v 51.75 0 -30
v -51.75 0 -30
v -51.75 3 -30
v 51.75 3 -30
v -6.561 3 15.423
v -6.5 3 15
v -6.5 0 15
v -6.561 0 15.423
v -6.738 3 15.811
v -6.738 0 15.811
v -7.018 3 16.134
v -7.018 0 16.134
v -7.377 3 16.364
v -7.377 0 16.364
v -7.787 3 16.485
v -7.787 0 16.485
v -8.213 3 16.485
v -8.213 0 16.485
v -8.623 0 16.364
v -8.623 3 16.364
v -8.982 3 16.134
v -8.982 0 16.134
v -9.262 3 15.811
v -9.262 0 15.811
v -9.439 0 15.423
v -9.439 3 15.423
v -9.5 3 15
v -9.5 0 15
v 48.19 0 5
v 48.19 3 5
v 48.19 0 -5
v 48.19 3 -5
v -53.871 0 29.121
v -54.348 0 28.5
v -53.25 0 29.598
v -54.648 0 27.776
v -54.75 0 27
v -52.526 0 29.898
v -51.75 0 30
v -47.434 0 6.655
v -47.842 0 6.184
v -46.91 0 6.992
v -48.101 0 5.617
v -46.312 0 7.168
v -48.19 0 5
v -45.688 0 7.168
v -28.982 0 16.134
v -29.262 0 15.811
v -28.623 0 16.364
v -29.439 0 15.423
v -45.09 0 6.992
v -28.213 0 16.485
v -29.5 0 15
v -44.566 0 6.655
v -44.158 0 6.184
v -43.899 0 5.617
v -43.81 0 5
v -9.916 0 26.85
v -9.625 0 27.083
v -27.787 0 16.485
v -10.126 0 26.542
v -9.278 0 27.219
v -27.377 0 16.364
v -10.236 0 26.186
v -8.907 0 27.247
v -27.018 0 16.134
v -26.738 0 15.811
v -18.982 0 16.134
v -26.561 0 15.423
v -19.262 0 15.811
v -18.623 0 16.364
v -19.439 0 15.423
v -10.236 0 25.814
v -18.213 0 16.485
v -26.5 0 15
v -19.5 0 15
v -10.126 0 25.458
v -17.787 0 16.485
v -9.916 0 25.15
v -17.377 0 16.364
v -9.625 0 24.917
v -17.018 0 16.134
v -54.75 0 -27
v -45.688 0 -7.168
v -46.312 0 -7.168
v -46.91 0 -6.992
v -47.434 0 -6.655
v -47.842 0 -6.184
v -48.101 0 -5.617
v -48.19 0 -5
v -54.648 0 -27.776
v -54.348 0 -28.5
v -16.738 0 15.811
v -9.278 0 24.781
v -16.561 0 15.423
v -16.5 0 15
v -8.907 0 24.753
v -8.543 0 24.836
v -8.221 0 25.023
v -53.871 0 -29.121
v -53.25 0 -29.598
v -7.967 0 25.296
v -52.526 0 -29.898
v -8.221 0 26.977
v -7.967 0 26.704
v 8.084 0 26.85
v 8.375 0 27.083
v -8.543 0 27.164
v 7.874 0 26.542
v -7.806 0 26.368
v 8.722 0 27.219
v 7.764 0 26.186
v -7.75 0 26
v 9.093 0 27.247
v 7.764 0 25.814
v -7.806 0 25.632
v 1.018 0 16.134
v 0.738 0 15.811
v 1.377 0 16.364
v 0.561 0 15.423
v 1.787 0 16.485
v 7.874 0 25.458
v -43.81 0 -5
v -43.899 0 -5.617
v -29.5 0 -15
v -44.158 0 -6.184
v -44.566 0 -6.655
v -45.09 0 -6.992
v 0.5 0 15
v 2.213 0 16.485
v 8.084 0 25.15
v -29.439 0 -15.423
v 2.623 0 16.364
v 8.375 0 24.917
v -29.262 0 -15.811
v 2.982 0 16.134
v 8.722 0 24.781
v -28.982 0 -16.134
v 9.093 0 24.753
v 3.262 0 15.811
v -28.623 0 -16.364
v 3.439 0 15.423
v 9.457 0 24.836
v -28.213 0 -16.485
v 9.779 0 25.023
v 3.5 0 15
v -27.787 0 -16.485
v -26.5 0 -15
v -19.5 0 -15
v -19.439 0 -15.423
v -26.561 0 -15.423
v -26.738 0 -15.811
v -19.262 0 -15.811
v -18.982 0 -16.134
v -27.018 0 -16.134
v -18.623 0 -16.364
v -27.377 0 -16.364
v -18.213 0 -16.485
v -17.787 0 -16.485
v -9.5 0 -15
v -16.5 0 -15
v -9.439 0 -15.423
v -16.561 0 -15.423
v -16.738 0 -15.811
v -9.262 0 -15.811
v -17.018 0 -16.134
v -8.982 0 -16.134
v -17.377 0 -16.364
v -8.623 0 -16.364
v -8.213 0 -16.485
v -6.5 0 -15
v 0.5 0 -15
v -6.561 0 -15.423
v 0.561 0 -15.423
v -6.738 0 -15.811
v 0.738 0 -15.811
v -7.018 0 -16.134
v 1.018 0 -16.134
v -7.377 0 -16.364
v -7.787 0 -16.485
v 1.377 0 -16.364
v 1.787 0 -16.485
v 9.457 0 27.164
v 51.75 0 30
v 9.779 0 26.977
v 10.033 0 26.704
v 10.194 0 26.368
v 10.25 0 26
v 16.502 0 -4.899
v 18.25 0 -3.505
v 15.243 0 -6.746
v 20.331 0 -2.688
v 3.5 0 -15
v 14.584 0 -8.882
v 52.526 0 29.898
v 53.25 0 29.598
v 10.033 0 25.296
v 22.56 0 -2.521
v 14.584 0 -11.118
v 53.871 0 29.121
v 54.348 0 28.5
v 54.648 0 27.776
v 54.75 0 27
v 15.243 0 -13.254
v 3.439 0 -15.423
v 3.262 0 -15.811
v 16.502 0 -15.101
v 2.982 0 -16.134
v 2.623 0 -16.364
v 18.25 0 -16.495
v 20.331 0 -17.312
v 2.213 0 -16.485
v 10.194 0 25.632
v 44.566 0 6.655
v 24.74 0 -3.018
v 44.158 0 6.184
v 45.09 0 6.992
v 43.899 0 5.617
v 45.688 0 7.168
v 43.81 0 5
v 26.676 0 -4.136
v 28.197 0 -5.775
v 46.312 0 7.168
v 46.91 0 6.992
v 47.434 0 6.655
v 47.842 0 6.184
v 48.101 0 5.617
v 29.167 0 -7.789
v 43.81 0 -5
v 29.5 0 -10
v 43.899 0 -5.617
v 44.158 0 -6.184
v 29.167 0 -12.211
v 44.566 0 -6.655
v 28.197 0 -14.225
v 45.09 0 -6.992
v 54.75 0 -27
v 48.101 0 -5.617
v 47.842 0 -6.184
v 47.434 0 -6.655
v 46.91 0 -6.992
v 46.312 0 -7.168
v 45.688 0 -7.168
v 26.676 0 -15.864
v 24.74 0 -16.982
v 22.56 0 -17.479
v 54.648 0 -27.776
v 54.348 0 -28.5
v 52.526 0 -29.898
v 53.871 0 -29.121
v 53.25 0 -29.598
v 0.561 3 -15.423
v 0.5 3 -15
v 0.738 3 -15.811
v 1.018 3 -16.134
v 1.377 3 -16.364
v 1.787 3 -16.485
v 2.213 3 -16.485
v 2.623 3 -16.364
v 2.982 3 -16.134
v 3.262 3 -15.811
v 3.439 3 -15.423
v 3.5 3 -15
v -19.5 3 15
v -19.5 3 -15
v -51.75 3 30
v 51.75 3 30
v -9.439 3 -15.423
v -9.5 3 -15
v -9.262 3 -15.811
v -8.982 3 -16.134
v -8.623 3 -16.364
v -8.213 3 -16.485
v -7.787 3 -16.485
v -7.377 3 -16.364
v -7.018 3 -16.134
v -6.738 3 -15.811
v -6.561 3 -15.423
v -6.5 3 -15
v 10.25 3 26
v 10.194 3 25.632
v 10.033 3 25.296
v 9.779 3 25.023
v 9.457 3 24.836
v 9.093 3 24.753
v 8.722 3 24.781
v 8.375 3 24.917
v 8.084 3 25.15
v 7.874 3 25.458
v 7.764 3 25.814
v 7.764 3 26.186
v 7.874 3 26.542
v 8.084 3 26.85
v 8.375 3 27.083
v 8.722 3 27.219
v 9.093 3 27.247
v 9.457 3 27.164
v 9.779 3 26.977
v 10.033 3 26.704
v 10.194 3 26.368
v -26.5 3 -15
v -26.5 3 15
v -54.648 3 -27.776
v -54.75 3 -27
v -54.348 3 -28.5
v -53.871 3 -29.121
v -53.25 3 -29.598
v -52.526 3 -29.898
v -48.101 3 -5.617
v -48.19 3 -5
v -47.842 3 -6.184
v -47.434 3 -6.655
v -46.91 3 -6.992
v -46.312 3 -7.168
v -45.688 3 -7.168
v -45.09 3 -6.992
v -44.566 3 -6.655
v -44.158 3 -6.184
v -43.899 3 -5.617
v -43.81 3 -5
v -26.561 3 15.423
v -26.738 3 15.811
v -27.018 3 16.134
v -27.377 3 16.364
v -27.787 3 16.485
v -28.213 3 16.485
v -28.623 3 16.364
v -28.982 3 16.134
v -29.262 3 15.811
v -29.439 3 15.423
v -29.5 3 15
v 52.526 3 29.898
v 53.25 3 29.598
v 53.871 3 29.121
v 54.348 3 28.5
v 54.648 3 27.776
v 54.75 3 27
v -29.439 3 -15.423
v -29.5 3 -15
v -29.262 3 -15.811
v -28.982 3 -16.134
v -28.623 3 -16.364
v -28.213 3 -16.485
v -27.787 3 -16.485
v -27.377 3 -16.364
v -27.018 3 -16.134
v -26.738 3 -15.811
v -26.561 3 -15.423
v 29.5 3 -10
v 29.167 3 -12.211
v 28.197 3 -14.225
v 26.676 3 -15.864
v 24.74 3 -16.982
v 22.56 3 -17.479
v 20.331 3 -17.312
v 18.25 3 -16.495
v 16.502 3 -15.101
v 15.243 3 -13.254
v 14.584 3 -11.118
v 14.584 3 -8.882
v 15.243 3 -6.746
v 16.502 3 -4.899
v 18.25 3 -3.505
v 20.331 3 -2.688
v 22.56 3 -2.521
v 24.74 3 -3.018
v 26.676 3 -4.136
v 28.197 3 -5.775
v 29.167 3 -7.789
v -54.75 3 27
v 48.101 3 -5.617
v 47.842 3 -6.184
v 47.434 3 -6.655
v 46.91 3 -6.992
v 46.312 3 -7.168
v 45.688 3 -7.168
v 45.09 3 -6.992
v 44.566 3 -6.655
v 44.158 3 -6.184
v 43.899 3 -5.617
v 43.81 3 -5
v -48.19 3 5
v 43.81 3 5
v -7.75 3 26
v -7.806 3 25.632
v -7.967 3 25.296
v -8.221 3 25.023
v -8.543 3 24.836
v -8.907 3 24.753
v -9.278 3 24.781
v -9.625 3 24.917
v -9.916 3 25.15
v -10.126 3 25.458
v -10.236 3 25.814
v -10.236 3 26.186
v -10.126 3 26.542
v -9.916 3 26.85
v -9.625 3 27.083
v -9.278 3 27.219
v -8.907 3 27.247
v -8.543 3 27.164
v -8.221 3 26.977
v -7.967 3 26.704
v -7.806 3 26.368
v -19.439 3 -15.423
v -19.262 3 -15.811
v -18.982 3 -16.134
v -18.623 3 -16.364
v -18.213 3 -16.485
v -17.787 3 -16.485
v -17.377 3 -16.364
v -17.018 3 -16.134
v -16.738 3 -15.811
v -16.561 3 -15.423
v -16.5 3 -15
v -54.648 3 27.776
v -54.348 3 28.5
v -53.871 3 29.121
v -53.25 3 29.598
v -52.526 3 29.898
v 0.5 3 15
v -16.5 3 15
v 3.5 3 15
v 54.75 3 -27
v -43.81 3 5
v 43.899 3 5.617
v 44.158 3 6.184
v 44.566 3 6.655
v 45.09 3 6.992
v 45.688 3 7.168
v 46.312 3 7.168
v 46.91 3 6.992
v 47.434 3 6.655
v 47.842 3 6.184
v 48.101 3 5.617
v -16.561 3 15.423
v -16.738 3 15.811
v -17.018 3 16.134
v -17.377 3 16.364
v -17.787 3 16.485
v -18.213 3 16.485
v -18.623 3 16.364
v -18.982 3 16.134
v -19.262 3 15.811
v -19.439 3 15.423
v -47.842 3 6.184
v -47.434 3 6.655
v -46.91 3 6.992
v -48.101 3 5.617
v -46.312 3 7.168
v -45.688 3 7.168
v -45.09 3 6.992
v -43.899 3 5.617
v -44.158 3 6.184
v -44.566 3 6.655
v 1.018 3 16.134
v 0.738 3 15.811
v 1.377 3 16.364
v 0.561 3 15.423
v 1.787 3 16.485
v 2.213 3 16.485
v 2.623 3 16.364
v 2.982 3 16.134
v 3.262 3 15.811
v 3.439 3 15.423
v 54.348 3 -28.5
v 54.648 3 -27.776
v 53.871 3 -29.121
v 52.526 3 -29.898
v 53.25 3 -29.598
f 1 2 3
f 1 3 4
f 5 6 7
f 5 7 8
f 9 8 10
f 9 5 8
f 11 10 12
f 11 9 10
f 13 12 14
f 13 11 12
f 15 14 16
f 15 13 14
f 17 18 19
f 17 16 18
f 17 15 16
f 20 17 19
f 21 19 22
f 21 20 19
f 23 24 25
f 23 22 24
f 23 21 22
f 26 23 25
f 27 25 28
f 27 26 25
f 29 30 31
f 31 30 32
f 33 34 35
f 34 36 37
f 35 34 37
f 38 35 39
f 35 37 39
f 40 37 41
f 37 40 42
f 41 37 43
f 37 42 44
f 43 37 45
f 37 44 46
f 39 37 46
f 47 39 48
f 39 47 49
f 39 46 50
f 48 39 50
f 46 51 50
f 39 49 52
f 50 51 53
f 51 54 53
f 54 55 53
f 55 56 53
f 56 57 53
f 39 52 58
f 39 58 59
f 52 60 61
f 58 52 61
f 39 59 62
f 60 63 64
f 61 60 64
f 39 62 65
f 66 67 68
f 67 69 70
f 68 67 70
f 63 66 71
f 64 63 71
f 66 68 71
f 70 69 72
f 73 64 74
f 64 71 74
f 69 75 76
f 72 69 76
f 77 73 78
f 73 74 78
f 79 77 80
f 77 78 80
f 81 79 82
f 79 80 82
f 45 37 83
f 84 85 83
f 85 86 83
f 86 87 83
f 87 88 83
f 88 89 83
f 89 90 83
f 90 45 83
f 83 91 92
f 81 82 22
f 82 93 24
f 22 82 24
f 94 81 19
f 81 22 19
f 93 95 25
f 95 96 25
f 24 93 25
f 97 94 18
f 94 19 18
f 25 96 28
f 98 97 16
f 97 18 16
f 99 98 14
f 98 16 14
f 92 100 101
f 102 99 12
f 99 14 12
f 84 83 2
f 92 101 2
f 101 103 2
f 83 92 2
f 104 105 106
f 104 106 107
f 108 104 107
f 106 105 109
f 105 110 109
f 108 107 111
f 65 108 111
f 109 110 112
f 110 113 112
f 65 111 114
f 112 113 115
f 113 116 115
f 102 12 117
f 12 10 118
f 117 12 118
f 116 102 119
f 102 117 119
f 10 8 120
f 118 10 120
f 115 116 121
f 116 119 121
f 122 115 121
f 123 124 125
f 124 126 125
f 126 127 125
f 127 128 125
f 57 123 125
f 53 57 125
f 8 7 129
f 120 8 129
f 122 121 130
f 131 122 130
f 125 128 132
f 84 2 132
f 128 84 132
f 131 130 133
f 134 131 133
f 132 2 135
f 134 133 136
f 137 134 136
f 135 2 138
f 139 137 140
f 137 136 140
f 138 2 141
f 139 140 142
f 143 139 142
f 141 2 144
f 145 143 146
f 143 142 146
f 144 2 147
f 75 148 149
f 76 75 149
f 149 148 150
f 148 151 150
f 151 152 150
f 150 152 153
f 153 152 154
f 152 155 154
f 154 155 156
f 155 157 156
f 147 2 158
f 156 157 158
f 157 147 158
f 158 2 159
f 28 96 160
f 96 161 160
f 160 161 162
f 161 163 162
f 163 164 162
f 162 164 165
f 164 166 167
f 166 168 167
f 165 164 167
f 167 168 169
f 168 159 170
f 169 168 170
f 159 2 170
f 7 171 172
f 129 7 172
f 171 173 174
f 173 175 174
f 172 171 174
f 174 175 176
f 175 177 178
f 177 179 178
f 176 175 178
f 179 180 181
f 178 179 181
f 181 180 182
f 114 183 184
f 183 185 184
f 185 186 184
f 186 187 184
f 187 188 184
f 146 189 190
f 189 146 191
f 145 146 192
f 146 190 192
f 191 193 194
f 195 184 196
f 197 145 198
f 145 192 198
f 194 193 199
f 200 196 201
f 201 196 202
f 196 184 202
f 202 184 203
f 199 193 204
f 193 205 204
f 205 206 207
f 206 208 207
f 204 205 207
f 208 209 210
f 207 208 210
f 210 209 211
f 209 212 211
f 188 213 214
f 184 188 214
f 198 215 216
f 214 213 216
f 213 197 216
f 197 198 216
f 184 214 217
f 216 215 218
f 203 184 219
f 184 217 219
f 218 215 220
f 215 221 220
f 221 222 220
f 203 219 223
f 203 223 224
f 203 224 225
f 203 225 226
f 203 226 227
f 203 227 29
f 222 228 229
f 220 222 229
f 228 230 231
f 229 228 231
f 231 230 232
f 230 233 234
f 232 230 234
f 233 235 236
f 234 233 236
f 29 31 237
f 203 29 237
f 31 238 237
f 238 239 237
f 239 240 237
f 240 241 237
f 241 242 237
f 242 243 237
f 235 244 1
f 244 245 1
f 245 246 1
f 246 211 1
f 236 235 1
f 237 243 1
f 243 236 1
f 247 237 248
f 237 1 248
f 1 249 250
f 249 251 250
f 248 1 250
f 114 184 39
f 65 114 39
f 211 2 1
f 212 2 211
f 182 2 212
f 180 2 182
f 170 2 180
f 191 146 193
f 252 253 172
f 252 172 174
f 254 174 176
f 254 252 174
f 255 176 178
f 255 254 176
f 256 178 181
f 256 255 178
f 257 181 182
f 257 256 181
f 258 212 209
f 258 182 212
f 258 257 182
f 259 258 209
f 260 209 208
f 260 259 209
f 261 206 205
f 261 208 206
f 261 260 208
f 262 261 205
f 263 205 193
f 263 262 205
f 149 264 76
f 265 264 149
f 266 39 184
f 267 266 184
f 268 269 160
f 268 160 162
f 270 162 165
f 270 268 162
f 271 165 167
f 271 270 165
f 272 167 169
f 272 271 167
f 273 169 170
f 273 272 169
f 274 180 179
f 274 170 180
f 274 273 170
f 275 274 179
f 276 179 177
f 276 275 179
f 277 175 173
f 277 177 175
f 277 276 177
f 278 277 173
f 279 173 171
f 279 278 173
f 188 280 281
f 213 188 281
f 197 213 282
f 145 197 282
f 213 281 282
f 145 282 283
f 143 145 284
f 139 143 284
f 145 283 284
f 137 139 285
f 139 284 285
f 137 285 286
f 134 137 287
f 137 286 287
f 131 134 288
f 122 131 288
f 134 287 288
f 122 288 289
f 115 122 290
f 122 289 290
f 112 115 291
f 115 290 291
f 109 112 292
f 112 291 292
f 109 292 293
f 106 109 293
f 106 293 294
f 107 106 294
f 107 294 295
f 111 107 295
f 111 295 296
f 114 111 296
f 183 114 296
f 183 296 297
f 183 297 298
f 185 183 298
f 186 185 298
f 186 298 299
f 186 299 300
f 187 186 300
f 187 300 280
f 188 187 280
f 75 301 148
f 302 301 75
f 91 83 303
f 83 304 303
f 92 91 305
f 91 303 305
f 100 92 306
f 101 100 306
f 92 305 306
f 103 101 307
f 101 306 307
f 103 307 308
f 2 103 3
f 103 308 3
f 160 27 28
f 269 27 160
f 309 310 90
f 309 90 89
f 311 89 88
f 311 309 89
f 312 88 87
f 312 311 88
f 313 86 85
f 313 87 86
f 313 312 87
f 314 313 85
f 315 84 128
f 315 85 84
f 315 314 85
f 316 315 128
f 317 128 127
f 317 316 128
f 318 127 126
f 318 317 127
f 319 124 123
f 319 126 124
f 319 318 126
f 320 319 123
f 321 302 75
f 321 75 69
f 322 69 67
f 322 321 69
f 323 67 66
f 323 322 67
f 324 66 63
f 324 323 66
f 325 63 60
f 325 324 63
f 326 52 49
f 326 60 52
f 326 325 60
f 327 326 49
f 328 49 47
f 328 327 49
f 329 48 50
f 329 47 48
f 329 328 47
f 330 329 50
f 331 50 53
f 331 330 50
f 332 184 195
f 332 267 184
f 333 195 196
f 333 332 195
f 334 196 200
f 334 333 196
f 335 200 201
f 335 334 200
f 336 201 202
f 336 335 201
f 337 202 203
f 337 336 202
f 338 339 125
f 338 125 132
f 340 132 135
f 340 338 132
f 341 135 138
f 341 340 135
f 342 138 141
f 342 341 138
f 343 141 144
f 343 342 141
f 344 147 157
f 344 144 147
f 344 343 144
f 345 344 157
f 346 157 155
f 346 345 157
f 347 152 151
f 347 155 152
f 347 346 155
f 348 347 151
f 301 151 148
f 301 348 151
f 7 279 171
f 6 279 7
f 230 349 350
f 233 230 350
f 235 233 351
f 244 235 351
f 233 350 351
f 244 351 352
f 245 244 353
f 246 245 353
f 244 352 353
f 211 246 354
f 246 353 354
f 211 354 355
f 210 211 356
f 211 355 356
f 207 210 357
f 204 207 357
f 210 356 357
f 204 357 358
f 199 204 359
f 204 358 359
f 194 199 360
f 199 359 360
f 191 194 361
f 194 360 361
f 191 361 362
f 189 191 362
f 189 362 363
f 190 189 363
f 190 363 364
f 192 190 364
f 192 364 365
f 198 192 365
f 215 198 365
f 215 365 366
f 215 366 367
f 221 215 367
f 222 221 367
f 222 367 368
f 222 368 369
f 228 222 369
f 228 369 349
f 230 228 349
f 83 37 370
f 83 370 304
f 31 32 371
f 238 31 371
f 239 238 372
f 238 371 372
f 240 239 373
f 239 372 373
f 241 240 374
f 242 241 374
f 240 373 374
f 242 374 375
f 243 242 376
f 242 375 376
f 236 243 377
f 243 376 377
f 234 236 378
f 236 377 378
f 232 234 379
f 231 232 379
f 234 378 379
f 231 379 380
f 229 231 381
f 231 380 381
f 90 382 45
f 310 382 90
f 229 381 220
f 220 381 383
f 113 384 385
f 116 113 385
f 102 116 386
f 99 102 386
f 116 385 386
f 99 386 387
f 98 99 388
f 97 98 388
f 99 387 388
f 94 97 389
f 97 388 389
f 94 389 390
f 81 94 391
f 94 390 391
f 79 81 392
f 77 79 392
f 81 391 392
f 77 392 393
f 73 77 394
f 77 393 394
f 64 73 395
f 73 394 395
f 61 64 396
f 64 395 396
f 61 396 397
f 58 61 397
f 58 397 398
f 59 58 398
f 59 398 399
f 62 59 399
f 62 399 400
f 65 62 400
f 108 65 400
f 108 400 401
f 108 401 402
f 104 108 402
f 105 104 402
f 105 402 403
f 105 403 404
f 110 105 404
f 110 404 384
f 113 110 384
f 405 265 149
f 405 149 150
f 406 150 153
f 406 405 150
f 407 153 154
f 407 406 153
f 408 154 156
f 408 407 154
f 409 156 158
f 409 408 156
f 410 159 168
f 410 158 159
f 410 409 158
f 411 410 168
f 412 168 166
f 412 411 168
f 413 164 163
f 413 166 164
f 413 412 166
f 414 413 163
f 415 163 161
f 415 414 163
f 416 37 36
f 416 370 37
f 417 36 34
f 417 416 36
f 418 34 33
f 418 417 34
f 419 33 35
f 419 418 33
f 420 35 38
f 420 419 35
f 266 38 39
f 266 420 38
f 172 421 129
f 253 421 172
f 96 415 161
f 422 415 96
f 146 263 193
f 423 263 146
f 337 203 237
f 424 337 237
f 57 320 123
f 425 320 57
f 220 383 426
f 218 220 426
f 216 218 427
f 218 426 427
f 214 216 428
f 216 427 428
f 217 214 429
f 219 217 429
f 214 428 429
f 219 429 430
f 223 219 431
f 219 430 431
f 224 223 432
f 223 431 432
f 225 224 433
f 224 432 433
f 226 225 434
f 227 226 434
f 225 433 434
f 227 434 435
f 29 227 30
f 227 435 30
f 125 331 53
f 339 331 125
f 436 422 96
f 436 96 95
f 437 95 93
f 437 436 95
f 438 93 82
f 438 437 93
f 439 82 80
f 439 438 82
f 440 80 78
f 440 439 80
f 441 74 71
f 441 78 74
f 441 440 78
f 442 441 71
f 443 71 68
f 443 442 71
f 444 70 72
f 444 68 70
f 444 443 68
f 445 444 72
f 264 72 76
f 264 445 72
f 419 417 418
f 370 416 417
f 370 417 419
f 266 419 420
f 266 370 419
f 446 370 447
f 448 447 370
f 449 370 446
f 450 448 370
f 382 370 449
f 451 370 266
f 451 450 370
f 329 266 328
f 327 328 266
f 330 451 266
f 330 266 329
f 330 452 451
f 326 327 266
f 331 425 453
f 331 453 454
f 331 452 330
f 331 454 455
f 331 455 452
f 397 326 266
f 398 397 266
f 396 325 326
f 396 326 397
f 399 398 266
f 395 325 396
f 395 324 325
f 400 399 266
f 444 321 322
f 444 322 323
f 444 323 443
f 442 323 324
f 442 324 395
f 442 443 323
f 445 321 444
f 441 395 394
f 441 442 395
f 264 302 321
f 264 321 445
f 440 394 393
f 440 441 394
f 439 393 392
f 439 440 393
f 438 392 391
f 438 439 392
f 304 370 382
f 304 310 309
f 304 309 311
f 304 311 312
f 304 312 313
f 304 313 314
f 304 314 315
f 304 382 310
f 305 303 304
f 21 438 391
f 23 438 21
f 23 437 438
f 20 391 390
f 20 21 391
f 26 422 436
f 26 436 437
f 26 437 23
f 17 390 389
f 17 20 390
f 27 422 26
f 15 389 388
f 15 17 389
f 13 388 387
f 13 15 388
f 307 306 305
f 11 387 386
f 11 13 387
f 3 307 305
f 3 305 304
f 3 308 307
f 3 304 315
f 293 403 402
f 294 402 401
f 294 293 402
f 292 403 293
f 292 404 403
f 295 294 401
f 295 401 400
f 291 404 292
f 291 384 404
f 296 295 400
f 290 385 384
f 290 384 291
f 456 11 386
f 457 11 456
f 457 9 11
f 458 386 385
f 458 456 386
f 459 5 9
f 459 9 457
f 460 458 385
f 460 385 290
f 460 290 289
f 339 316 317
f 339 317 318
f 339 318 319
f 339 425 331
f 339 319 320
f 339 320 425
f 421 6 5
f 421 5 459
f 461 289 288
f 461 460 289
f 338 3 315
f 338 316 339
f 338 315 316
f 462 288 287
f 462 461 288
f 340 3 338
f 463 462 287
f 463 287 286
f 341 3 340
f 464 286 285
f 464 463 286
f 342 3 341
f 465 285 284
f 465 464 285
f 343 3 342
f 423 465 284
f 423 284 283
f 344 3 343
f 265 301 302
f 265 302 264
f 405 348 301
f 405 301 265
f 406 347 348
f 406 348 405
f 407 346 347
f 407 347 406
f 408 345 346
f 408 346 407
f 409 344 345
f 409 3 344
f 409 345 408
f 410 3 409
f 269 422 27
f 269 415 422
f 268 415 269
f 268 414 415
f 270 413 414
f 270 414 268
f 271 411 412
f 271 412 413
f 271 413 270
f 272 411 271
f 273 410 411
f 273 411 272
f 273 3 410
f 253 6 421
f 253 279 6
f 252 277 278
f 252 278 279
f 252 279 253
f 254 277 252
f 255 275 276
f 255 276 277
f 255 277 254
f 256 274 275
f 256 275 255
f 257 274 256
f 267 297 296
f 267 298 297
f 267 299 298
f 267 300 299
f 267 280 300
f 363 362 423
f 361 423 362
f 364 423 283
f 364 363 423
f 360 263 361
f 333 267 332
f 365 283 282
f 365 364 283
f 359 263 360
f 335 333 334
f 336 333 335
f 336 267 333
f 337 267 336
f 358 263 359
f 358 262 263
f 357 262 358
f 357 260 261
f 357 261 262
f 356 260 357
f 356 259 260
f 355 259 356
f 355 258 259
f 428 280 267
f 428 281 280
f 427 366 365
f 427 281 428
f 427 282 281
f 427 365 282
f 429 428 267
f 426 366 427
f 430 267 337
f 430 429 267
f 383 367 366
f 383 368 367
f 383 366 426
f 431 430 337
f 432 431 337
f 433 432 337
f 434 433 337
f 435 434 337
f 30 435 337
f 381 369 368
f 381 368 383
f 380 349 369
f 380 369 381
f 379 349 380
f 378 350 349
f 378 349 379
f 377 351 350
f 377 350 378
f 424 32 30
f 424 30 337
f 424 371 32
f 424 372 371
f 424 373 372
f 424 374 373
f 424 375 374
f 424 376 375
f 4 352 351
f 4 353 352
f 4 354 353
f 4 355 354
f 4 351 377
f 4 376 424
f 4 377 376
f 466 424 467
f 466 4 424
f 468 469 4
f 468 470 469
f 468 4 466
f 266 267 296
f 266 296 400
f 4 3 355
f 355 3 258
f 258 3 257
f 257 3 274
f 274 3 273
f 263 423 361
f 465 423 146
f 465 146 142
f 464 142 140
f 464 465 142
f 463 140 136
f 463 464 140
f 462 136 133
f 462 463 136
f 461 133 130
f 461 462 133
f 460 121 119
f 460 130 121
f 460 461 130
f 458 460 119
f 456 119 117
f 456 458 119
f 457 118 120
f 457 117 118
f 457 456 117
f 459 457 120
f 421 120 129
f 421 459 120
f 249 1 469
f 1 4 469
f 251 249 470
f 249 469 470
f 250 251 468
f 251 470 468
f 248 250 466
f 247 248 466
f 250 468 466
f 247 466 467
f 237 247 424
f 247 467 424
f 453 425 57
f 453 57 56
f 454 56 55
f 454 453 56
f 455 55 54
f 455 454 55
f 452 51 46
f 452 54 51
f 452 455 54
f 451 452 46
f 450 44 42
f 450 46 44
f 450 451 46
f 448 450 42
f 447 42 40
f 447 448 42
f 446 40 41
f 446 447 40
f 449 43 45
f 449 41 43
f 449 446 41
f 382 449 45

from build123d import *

# Parameters (mm, degrees)
SKETCH_1_W          = 109.5
SKETCH_1_H          = 60
EXTRUDE_1_DEPTH     = 3
SKETCH_2_R          = 1.25
CUT_EXTRUDE_1_DEPTH = 10
FILLET_1_R          = 3
CUT_EXTRUDE_2_DEPTH = 10
SKETCH_5_R          = 7.5
CUT_EXTRUDE_3_DEPTH = 10


with BuildPart() as part:
    # 草图1 → 凸台-拉伸1 (new body)
    with BuildSketch(Plane(origin=(0, 0, 0), x_dir=(1, 0, 0), z_dir=(0, 1, 0))):
        Rectangle(SKETCH_1_W, SKETCH_1_H)
    extrude(amount=EXTRUDE_1_DEPTH)

    # 草图2 → 切除-拉伸1 (cut)
    with BuildSketch(Plane(origin=(0, 3, 0), x_dir=(1, 0, 0), z_dir=(0, 1, 0))):
        with Locations((9, -26)):
            Circle(SKETCH_2_R)
        with Locations((-9, -26)):
            Circle(SKETCH_2_R)
    extrude(amount=-CUT_EXTRUDE_1_DEPTH, mode=Mode.SUBTRACT)

    # 圆角1
    fillet_1_edges = [part.edges().sort_by_distance(p)[0] for p in [
        (54.75, 1.5, 30),
        (-54.75, 1.5, 30),
        (-54.75, 1.5, -30),
        (54.75, 1.5, -30),
    ]]
    fillet(fillet_1_edges, radius=FILLET_1_R)

    # 草图3 → 切除-拉伸2 (cut)
    with BuildSketch(Plane(origin=(0, 3, 0), x_dir=(1, 0, 0), z_dir=(0, 1, 0))):
        with BuildLine():
            Line((-43.809910809, 5), (-43.809910809, -5))
            ThreePointArc((-43.809910809, -5), (-46, -7.190089191), (-48.190089191, -5))
            Line((-48.190089191, -5), (-48.190089191, 5))
            ThreePointArc((-48.190089191, 5), (-46, 7.190089191), (-43.809910809, 5))
        make_face()
        with BuildLine():
            Line((43.809910809, 5), (43.809910809, -5))
            ThreePointArc((43.809910809, -5), (46, -7.190089191), (48.190089191, -5))
            Line((48.190089191, -5), (48.190089191, 5))
            ThreePointArc((48.190089191, 5), (46, 7.190089191), (43.809910809, 5))
        make_face()
    extrude(amount=-CUT_EXTRUDE_2_DEPTH, mode=Mode.SUBTRACT)

    # 草图5 → 切除-拉伸3 (cut)
    with BuildSketch(Plane(origin=(0, 3, 0), x_dir=(1, 0, 0), z_dir=(0, 1, 0))):
        with Locations((22, 10)):
            Circle(SKETCH_5_R)
        with BuildLine():
            Line((-26.5, 15), (-26.5, -15))
            ThreePointArc((-26.5, -15), (-28, -16.5), (-29.5, -15))
            Line((-29.5, -15), (-29.5, 15))
            ThreePointArc((-29.5, 15), (-28, 16.5), (-26.5, 15))
        make_face()
        with BuildLine():
            Line((-16.5, 15), (-16.5, -15))
            ThreePointArc((-16.5, -15), (-18, -16.5), (-19.5, -15))
            Line((-19.5, -15), (-19.5, 15))
            ThreePointArc((-19.5, 15), (-18, 16.5), (-16.5, 15))
        make_face()
        with BuildLine():
            Line((-6.5, 15), (-6.5, -15))
            ThreePointArc((-6.5, -15), (-8, -16.5), (-9.5, -15))
            Line((-9.5, -15), (-9.5, 15))
            ThreePointArc((-9.5, 15), (-8, 16.5), (-6.5, 15))
        make_face()
        with BuildLine():
            Line((3.5, 15), (3.5, -15))
            ThreePointArc((3.5, -15), (2, -16.5), (0.5, -15))
            Line((0.5, -15), (0.5, 15))
            ThreePointArc((0.5, 15), (2, 16.5), (3.5, 15))
        make_face()
    extrude(amount=-CUT_EXTRUDE_3_DEPTH, mode=Mode.SUBTRACT)


solid = part.part
